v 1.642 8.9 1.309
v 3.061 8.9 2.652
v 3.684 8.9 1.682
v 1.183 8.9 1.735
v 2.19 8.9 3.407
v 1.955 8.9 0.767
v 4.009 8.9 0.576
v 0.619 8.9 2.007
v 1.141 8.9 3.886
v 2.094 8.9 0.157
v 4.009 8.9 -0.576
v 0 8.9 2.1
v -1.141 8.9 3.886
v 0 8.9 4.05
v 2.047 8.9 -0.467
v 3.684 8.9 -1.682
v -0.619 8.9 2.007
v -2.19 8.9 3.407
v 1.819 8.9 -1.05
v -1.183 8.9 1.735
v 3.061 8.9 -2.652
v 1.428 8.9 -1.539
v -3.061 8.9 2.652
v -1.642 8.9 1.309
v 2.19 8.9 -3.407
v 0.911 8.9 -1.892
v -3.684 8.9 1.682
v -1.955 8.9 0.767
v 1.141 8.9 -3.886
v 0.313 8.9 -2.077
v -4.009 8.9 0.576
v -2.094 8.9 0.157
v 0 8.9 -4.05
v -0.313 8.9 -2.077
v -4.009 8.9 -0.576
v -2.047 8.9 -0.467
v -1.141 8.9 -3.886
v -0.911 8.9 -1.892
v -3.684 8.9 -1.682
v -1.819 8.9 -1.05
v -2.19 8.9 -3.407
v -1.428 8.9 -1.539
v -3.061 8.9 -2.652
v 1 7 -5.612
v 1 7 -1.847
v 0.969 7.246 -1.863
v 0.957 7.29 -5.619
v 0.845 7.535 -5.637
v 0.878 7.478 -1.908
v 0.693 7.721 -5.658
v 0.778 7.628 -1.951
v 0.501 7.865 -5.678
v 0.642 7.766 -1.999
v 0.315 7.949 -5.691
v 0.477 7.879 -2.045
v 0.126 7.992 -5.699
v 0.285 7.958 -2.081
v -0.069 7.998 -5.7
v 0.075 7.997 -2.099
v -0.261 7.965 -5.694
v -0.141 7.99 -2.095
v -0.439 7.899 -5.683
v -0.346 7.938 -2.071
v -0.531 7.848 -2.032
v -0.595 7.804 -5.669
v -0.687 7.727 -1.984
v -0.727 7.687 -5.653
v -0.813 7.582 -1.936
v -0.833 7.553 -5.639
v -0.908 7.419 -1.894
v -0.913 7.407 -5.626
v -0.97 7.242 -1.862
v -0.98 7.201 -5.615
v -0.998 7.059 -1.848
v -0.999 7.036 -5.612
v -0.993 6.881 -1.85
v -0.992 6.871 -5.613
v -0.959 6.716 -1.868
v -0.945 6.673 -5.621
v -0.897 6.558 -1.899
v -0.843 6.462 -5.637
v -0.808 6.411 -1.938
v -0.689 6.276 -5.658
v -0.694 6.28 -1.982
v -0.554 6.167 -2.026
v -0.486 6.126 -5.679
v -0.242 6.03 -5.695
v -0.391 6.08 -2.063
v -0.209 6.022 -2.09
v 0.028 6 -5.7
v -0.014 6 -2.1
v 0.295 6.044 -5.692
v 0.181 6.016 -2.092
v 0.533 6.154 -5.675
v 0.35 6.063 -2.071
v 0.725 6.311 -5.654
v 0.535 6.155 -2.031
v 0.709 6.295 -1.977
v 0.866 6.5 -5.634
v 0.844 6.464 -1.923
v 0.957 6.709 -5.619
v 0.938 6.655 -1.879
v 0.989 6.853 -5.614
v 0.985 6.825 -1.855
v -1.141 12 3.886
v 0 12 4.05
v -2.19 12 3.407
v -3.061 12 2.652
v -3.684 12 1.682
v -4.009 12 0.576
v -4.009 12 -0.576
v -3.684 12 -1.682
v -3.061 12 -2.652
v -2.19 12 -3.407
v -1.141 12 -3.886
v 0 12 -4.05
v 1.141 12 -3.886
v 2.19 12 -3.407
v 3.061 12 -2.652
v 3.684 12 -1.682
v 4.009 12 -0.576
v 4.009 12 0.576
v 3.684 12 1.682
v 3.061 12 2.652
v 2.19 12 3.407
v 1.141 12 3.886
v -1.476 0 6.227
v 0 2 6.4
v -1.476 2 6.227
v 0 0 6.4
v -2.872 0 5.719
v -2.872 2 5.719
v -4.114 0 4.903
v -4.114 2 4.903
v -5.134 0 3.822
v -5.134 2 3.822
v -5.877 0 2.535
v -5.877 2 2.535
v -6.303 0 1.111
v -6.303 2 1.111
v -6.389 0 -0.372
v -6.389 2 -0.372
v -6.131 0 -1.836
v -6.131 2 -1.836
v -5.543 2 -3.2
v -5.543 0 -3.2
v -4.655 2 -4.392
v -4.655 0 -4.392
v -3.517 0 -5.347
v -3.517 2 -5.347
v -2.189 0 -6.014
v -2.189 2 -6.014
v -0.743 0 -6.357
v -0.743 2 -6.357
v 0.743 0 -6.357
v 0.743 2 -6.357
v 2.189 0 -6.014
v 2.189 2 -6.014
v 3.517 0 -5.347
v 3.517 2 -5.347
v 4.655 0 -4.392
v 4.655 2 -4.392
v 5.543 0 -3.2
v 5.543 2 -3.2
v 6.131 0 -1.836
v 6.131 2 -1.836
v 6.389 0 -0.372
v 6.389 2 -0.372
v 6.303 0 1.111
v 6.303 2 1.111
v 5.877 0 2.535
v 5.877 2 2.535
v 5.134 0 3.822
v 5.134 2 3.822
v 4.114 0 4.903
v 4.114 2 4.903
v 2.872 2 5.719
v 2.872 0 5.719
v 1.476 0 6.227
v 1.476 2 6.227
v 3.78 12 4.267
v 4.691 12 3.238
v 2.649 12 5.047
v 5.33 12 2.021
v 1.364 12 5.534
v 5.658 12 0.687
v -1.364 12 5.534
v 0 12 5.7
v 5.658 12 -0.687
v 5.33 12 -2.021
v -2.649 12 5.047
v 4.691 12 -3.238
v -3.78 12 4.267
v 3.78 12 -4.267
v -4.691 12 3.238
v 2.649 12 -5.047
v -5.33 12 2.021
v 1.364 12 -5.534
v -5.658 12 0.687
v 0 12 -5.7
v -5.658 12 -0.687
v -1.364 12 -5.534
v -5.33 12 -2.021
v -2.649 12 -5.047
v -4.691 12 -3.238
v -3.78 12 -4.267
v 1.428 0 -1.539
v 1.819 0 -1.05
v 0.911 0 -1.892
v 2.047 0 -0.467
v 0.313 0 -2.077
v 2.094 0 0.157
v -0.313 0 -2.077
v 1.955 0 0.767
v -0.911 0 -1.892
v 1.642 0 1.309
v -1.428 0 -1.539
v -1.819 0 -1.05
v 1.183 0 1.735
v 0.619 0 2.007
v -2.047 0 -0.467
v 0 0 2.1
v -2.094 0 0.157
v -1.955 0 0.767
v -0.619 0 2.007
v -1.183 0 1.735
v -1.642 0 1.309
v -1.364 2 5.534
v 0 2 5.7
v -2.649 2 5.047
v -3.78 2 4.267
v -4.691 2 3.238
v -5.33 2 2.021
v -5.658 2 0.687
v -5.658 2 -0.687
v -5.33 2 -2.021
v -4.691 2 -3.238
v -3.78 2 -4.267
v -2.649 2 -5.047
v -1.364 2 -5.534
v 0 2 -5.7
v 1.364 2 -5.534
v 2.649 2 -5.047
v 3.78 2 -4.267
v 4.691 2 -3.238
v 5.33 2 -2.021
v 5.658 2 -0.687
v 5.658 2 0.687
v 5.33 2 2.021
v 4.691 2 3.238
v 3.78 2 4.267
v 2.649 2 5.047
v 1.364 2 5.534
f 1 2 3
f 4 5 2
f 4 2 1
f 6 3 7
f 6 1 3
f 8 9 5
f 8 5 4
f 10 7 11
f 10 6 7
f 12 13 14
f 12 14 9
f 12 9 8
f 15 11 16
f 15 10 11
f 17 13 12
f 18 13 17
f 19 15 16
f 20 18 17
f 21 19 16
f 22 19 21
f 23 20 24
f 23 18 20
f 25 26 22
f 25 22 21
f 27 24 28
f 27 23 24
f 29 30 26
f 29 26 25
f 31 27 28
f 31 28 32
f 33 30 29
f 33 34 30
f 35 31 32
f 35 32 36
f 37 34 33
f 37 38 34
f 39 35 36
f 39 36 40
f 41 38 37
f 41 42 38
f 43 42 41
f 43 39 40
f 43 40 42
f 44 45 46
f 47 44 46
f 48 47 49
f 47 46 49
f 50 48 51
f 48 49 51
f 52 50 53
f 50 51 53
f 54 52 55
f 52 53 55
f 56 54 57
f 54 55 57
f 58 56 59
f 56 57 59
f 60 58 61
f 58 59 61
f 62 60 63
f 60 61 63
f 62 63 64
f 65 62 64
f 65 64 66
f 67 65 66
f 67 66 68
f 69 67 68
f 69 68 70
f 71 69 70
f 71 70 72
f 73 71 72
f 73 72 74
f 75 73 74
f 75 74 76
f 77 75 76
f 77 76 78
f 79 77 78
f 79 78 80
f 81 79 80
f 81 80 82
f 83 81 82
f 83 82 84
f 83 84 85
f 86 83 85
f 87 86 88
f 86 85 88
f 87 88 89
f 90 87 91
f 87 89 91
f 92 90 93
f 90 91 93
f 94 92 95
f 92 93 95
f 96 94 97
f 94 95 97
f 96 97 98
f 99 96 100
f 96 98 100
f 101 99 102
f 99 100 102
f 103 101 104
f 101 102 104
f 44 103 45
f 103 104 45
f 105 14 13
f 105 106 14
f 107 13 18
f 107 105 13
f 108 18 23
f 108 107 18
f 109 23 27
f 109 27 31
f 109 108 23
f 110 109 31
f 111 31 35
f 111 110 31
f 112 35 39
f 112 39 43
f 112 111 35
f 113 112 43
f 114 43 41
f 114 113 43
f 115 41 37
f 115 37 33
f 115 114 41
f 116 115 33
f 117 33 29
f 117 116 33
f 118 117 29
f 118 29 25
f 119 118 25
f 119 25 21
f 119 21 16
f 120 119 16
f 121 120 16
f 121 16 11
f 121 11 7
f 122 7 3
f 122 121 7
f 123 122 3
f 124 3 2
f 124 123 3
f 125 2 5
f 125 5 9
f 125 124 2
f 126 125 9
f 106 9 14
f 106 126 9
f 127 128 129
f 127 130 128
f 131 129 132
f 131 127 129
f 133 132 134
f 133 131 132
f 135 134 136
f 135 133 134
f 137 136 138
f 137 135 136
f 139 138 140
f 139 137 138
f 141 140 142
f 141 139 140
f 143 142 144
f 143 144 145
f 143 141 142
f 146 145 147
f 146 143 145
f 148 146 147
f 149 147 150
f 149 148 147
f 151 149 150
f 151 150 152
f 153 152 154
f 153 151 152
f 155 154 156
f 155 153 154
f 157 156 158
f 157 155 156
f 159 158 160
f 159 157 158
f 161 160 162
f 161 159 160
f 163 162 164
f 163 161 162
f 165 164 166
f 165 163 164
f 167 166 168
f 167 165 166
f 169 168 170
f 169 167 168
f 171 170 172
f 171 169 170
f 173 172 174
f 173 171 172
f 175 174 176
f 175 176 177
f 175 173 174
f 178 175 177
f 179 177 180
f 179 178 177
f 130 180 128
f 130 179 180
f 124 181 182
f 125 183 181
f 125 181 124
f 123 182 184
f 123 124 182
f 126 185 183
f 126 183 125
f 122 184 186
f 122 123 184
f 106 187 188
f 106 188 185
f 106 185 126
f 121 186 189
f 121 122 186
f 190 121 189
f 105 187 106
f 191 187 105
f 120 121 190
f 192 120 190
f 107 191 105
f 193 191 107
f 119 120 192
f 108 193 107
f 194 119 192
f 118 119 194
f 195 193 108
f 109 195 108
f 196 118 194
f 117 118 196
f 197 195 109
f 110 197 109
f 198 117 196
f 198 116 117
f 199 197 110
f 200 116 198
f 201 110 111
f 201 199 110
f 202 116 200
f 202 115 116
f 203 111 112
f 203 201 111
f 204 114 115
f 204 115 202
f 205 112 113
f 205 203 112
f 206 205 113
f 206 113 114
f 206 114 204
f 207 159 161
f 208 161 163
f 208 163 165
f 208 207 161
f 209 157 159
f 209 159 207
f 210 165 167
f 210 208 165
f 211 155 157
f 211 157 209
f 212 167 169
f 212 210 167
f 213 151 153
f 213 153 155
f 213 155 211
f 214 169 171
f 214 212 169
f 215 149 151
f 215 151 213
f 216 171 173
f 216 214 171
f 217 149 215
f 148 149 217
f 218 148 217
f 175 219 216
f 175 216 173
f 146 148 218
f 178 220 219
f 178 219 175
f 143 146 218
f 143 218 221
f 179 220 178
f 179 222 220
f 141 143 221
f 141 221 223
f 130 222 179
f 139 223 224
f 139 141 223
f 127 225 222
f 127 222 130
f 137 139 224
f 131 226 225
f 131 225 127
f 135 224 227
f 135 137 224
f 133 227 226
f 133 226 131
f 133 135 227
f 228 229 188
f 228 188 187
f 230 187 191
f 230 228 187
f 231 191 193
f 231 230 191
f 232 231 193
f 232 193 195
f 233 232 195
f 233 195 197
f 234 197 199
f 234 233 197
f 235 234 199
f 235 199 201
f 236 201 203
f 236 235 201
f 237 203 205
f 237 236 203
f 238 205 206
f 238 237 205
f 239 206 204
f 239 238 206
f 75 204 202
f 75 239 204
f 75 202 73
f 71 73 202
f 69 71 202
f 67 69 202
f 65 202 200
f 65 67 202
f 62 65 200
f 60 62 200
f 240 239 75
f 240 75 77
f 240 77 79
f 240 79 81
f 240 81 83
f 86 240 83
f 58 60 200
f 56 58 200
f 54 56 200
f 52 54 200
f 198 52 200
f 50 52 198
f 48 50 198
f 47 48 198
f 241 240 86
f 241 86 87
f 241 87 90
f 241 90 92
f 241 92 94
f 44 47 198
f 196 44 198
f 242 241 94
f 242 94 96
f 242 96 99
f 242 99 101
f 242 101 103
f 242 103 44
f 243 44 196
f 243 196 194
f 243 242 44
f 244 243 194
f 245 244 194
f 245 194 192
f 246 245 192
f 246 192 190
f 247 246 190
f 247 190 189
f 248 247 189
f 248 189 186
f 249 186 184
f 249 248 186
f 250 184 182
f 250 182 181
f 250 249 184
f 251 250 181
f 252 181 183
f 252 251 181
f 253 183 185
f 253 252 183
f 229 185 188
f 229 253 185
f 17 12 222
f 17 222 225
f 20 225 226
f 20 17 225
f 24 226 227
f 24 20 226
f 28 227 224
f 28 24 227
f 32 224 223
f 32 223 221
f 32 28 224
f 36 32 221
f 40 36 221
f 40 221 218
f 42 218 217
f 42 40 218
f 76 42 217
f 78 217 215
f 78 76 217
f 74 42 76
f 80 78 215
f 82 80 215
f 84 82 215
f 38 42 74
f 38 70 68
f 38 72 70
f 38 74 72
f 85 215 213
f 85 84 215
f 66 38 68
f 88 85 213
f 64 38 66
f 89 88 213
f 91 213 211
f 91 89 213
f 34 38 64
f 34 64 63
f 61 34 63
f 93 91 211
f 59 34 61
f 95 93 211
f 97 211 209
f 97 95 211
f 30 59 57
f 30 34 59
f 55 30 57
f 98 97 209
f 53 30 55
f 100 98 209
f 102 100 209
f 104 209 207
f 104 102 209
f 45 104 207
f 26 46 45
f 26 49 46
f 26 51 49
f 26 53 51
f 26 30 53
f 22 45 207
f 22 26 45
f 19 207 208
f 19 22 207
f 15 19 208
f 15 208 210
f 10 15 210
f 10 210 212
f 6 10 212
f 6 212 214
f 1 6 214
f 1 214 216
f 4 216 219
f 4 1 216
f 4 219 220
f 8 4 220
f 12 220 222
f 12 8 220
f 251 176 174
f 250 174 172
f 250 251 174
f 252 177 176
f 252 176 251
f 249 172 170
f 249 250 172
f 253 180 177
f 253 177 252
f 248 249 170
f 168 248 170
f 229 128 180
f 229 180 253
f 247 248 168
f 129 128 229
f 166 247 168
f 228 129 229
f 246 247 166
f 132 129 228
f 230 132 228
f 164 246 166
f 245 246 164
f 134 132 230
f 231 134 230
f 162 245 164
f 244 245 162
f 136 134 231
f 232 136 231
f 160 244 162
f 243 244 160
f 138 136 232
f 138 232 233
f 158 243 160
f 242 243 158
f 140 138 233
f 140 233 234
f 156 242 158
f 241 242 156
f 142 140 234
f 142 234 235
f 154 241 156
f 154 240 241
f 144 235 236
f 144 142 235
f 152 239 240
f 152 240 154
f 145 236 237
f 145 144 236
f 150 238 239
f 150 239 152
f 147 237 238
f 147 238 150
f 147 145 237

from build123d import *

# Parameters (mm, degrees)
F4_D     = 2
F4_DEPTH = 6.401


with BuildPart() as f2:
    # F1 (on Right) → F2 (revolve)
    with BuildSketch(Plane.YZ):
        Polygon((0, 2.1), (8.9, 2.1), (8.9, 4.05), (12, 4.05), (12, 5.7), (2, 5.7), (2, 6.4), (0, 6.4), align=None)
    revolve(axis=Axis((0, 5.7350749573, 0), (0, -1, 0)))

    # F4 (through all, one way)
    with BuildSketch(Plane.XY):
        with Locations((0, 7)):
            Circle(F4_D / 2)
    extrude(amount=-F4_DEPTH, mode=Mode.SUBTRACT)


solid = f2.part
